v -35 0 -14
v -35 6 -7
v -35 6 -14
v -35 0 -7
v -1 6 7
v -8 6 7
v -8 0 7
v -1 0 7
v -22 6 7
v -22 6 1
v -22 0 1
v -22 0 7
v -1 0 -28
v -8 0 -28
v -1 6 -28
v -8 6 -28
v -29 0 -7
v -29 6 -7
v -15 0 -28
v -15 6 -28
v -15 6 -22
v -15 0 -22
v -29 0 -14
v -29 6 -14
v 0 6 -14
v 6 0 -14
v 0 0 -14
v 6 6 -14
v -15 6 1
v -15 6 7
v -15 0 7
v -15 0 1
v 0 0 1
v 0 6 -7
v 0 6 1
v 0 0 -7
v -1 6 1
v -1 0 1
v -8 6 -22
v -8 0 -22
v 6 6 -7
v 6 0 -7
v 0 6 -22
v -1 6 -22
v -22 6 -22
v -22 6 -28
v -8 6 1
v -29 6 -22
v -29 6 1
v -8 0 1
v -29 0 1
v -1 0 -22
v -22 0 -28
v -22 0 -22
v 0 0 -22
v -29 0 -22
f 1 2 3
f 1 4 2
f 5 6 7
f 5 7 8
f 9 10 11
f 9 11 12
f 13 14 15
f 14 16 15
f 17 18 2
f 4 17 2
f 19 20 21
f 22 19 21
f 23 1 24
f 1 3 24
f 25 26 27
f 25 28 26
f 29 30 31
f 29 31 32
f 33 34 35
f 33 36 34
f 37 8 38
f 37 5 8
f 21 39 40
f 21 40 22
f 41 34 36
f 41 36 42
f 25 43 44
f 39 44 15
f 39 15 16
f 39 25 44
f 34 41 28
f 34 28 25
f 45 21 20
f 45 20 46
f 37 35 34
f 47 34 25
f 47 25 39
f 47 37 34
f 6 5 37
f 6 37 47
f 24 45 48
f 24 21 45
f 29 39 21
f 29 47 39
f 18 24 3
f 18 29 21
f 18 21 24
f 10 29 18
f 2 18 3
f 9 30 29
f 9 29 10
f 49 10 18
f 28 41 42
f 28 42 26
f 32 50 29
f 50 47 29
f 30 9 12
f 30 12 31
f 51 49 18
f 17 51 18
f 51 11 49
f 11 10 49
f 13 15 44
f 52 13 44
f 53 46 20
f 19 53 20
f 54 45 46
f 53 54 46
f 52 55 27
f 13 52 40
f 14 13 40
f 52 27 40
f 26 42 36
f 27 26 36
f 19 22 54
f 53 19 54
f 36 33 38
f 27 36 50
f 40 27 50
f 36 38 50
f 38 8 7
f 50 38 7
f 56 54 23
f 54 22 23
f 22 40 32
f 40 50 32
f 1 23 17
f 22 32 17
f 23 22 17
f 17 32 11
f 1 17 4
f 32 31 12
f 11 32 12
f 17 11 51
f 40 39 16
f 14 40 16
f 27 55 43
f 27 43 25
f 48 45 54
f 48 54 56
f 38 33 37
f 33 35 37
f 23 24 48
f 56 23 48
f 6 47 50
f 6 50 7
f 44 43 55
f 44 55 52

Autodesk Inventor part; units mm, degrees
ref_plane "YZ Plane" through (0, 0, 0) normal (1, 0, 0) x (0, 1, 0)
ref_plane "XZ Plane" through (0, 0, 0) normal (0, 1, 0) x (-1, 0, 0)
ref_plane "XY Plane" through (0, 0, 0) normal (0, 0, 1) x (1, 0, 0)
sketch "Sketch1" plane through (0, 0, 0) normal (0, 1, 0) x (-1, 0, 0)
  line L0 (0, 0) -> (35, 0)
  line L1 (35, 0) -> (35, -21)
  line L2 (35, -21) -> (0, -21)
  line L3 (0, -21) -> (0, 0)
  dimension "d0" = 35
  dimension "d1" = 21
extrude "Extrusion1" add sketch "Sketch1" along normal blind 6
sketch "Sketch2" plane through (0, 6, 0) normal (0, 1, 0) x (1, 0, 0)
  line L0 (-35, 21) -> (-35, 0) projected
  line L1 (-35, 0) -> (-29, 0)
  line L2 (-29, 0) -> (-29, 7)
  line L3 (-29, 7) -> (-35, 7)
  line L4 (-35, 7) -> (-35, 0)
  point P0 (0, 0)
  dimension "d4" = 6
  dimension "d5" = 7
extrude "Extrusion2" cut sketch "Sketch2" against normal blind 6
pattern_linear "Rectangular Pattern1" count 2 spacing 14 along (0, 0, -1) of "Extrusion2"
sketch "Sketch3" plane through (0, 6, 0) normal (0, 1, 0) x (1, 0, 0)
  line L0 (-29, 7) -> (-29, 0) projected
  line L1 (-29, 0) -> (0, 0)
  line L2 (0, 0) -> (0, -1)
  line L3 (0, -1) -> (-29, -1)
  line L4 (-29, -1) -> (-29, 0)
  line L5 (-29, 14) -> (-29, 21) projected
  line L6 (-29, 21) -> (0, 21)
  line L7 (0, 21) -> (0, 22)
  line L8 (0, 22) -> (-29, 22)
  line L9 (-29, 22) -> (-29, 21)
  point P0 (0, 0)
  dimension "d11" = 29
  dimension "d12" = 1
  dimension "d13" = 29
  dimension "d14" = 1
extrude "Extrusion3" add sketch "Sketch3" against normal blind 6
sketch "Sketch4" plane through (0, 6, 0) normal (0, 1, 0) x (1, 0, 0)
  line L0 (-29, -1) -> (-29, 7) projected
  line L1 (0, 22) -> (0, -1) projected
  line L2 (0, 7) -> (6, 7)
  line L3 (6, 7) -> (6, 14)
  line L4 (6, 14) -> (0, 14)
  line L5 (0, 14) -> (0, 7)
  point P0 (0, 0)
  dimension "d17" = 6
  dimension "d18" = 7
extrude "Extrusion4" add sketch "Sketch4" against normal blind 6
sketch "Sketch5" plane through (0, 6, 0) normal (0, 1, 0) x (1, 0, 0)
  line L0 (0, -1) -> (-29, -1) projected
  line L1 (-29, -1) -> (-22, -1)
  line L2 (-22, -1) -> (-22, -7)
  line L3 (-22, -7) -> (-15, -7)
  line L4 (-15, -7) -> (-15, -1)
  line L5 (-29, 22) -> (0, 22) projected
  line L6 (-29, 22) -> (-22, 22)
  line L7 (-22, 22) -> (-22, 28)
  line L8 (-22, 28) -> (-15, 28)
  line L9 (-15, 28) -> (-15, 22)
  point P0 (0, 0)
  dimension "d22" = 6
  dimension "d23" = 7
  dimension "d25" = 6
  dimension "d26" = 7
extrude "Extrusion5" add sketch "Sketch5" against normal blind 6
pattern_linear "Rectangular Pattern2" count 2 spacing 14 along (1, 0, 0) of "Extrusion5"
properties part number "g_arm 2"
